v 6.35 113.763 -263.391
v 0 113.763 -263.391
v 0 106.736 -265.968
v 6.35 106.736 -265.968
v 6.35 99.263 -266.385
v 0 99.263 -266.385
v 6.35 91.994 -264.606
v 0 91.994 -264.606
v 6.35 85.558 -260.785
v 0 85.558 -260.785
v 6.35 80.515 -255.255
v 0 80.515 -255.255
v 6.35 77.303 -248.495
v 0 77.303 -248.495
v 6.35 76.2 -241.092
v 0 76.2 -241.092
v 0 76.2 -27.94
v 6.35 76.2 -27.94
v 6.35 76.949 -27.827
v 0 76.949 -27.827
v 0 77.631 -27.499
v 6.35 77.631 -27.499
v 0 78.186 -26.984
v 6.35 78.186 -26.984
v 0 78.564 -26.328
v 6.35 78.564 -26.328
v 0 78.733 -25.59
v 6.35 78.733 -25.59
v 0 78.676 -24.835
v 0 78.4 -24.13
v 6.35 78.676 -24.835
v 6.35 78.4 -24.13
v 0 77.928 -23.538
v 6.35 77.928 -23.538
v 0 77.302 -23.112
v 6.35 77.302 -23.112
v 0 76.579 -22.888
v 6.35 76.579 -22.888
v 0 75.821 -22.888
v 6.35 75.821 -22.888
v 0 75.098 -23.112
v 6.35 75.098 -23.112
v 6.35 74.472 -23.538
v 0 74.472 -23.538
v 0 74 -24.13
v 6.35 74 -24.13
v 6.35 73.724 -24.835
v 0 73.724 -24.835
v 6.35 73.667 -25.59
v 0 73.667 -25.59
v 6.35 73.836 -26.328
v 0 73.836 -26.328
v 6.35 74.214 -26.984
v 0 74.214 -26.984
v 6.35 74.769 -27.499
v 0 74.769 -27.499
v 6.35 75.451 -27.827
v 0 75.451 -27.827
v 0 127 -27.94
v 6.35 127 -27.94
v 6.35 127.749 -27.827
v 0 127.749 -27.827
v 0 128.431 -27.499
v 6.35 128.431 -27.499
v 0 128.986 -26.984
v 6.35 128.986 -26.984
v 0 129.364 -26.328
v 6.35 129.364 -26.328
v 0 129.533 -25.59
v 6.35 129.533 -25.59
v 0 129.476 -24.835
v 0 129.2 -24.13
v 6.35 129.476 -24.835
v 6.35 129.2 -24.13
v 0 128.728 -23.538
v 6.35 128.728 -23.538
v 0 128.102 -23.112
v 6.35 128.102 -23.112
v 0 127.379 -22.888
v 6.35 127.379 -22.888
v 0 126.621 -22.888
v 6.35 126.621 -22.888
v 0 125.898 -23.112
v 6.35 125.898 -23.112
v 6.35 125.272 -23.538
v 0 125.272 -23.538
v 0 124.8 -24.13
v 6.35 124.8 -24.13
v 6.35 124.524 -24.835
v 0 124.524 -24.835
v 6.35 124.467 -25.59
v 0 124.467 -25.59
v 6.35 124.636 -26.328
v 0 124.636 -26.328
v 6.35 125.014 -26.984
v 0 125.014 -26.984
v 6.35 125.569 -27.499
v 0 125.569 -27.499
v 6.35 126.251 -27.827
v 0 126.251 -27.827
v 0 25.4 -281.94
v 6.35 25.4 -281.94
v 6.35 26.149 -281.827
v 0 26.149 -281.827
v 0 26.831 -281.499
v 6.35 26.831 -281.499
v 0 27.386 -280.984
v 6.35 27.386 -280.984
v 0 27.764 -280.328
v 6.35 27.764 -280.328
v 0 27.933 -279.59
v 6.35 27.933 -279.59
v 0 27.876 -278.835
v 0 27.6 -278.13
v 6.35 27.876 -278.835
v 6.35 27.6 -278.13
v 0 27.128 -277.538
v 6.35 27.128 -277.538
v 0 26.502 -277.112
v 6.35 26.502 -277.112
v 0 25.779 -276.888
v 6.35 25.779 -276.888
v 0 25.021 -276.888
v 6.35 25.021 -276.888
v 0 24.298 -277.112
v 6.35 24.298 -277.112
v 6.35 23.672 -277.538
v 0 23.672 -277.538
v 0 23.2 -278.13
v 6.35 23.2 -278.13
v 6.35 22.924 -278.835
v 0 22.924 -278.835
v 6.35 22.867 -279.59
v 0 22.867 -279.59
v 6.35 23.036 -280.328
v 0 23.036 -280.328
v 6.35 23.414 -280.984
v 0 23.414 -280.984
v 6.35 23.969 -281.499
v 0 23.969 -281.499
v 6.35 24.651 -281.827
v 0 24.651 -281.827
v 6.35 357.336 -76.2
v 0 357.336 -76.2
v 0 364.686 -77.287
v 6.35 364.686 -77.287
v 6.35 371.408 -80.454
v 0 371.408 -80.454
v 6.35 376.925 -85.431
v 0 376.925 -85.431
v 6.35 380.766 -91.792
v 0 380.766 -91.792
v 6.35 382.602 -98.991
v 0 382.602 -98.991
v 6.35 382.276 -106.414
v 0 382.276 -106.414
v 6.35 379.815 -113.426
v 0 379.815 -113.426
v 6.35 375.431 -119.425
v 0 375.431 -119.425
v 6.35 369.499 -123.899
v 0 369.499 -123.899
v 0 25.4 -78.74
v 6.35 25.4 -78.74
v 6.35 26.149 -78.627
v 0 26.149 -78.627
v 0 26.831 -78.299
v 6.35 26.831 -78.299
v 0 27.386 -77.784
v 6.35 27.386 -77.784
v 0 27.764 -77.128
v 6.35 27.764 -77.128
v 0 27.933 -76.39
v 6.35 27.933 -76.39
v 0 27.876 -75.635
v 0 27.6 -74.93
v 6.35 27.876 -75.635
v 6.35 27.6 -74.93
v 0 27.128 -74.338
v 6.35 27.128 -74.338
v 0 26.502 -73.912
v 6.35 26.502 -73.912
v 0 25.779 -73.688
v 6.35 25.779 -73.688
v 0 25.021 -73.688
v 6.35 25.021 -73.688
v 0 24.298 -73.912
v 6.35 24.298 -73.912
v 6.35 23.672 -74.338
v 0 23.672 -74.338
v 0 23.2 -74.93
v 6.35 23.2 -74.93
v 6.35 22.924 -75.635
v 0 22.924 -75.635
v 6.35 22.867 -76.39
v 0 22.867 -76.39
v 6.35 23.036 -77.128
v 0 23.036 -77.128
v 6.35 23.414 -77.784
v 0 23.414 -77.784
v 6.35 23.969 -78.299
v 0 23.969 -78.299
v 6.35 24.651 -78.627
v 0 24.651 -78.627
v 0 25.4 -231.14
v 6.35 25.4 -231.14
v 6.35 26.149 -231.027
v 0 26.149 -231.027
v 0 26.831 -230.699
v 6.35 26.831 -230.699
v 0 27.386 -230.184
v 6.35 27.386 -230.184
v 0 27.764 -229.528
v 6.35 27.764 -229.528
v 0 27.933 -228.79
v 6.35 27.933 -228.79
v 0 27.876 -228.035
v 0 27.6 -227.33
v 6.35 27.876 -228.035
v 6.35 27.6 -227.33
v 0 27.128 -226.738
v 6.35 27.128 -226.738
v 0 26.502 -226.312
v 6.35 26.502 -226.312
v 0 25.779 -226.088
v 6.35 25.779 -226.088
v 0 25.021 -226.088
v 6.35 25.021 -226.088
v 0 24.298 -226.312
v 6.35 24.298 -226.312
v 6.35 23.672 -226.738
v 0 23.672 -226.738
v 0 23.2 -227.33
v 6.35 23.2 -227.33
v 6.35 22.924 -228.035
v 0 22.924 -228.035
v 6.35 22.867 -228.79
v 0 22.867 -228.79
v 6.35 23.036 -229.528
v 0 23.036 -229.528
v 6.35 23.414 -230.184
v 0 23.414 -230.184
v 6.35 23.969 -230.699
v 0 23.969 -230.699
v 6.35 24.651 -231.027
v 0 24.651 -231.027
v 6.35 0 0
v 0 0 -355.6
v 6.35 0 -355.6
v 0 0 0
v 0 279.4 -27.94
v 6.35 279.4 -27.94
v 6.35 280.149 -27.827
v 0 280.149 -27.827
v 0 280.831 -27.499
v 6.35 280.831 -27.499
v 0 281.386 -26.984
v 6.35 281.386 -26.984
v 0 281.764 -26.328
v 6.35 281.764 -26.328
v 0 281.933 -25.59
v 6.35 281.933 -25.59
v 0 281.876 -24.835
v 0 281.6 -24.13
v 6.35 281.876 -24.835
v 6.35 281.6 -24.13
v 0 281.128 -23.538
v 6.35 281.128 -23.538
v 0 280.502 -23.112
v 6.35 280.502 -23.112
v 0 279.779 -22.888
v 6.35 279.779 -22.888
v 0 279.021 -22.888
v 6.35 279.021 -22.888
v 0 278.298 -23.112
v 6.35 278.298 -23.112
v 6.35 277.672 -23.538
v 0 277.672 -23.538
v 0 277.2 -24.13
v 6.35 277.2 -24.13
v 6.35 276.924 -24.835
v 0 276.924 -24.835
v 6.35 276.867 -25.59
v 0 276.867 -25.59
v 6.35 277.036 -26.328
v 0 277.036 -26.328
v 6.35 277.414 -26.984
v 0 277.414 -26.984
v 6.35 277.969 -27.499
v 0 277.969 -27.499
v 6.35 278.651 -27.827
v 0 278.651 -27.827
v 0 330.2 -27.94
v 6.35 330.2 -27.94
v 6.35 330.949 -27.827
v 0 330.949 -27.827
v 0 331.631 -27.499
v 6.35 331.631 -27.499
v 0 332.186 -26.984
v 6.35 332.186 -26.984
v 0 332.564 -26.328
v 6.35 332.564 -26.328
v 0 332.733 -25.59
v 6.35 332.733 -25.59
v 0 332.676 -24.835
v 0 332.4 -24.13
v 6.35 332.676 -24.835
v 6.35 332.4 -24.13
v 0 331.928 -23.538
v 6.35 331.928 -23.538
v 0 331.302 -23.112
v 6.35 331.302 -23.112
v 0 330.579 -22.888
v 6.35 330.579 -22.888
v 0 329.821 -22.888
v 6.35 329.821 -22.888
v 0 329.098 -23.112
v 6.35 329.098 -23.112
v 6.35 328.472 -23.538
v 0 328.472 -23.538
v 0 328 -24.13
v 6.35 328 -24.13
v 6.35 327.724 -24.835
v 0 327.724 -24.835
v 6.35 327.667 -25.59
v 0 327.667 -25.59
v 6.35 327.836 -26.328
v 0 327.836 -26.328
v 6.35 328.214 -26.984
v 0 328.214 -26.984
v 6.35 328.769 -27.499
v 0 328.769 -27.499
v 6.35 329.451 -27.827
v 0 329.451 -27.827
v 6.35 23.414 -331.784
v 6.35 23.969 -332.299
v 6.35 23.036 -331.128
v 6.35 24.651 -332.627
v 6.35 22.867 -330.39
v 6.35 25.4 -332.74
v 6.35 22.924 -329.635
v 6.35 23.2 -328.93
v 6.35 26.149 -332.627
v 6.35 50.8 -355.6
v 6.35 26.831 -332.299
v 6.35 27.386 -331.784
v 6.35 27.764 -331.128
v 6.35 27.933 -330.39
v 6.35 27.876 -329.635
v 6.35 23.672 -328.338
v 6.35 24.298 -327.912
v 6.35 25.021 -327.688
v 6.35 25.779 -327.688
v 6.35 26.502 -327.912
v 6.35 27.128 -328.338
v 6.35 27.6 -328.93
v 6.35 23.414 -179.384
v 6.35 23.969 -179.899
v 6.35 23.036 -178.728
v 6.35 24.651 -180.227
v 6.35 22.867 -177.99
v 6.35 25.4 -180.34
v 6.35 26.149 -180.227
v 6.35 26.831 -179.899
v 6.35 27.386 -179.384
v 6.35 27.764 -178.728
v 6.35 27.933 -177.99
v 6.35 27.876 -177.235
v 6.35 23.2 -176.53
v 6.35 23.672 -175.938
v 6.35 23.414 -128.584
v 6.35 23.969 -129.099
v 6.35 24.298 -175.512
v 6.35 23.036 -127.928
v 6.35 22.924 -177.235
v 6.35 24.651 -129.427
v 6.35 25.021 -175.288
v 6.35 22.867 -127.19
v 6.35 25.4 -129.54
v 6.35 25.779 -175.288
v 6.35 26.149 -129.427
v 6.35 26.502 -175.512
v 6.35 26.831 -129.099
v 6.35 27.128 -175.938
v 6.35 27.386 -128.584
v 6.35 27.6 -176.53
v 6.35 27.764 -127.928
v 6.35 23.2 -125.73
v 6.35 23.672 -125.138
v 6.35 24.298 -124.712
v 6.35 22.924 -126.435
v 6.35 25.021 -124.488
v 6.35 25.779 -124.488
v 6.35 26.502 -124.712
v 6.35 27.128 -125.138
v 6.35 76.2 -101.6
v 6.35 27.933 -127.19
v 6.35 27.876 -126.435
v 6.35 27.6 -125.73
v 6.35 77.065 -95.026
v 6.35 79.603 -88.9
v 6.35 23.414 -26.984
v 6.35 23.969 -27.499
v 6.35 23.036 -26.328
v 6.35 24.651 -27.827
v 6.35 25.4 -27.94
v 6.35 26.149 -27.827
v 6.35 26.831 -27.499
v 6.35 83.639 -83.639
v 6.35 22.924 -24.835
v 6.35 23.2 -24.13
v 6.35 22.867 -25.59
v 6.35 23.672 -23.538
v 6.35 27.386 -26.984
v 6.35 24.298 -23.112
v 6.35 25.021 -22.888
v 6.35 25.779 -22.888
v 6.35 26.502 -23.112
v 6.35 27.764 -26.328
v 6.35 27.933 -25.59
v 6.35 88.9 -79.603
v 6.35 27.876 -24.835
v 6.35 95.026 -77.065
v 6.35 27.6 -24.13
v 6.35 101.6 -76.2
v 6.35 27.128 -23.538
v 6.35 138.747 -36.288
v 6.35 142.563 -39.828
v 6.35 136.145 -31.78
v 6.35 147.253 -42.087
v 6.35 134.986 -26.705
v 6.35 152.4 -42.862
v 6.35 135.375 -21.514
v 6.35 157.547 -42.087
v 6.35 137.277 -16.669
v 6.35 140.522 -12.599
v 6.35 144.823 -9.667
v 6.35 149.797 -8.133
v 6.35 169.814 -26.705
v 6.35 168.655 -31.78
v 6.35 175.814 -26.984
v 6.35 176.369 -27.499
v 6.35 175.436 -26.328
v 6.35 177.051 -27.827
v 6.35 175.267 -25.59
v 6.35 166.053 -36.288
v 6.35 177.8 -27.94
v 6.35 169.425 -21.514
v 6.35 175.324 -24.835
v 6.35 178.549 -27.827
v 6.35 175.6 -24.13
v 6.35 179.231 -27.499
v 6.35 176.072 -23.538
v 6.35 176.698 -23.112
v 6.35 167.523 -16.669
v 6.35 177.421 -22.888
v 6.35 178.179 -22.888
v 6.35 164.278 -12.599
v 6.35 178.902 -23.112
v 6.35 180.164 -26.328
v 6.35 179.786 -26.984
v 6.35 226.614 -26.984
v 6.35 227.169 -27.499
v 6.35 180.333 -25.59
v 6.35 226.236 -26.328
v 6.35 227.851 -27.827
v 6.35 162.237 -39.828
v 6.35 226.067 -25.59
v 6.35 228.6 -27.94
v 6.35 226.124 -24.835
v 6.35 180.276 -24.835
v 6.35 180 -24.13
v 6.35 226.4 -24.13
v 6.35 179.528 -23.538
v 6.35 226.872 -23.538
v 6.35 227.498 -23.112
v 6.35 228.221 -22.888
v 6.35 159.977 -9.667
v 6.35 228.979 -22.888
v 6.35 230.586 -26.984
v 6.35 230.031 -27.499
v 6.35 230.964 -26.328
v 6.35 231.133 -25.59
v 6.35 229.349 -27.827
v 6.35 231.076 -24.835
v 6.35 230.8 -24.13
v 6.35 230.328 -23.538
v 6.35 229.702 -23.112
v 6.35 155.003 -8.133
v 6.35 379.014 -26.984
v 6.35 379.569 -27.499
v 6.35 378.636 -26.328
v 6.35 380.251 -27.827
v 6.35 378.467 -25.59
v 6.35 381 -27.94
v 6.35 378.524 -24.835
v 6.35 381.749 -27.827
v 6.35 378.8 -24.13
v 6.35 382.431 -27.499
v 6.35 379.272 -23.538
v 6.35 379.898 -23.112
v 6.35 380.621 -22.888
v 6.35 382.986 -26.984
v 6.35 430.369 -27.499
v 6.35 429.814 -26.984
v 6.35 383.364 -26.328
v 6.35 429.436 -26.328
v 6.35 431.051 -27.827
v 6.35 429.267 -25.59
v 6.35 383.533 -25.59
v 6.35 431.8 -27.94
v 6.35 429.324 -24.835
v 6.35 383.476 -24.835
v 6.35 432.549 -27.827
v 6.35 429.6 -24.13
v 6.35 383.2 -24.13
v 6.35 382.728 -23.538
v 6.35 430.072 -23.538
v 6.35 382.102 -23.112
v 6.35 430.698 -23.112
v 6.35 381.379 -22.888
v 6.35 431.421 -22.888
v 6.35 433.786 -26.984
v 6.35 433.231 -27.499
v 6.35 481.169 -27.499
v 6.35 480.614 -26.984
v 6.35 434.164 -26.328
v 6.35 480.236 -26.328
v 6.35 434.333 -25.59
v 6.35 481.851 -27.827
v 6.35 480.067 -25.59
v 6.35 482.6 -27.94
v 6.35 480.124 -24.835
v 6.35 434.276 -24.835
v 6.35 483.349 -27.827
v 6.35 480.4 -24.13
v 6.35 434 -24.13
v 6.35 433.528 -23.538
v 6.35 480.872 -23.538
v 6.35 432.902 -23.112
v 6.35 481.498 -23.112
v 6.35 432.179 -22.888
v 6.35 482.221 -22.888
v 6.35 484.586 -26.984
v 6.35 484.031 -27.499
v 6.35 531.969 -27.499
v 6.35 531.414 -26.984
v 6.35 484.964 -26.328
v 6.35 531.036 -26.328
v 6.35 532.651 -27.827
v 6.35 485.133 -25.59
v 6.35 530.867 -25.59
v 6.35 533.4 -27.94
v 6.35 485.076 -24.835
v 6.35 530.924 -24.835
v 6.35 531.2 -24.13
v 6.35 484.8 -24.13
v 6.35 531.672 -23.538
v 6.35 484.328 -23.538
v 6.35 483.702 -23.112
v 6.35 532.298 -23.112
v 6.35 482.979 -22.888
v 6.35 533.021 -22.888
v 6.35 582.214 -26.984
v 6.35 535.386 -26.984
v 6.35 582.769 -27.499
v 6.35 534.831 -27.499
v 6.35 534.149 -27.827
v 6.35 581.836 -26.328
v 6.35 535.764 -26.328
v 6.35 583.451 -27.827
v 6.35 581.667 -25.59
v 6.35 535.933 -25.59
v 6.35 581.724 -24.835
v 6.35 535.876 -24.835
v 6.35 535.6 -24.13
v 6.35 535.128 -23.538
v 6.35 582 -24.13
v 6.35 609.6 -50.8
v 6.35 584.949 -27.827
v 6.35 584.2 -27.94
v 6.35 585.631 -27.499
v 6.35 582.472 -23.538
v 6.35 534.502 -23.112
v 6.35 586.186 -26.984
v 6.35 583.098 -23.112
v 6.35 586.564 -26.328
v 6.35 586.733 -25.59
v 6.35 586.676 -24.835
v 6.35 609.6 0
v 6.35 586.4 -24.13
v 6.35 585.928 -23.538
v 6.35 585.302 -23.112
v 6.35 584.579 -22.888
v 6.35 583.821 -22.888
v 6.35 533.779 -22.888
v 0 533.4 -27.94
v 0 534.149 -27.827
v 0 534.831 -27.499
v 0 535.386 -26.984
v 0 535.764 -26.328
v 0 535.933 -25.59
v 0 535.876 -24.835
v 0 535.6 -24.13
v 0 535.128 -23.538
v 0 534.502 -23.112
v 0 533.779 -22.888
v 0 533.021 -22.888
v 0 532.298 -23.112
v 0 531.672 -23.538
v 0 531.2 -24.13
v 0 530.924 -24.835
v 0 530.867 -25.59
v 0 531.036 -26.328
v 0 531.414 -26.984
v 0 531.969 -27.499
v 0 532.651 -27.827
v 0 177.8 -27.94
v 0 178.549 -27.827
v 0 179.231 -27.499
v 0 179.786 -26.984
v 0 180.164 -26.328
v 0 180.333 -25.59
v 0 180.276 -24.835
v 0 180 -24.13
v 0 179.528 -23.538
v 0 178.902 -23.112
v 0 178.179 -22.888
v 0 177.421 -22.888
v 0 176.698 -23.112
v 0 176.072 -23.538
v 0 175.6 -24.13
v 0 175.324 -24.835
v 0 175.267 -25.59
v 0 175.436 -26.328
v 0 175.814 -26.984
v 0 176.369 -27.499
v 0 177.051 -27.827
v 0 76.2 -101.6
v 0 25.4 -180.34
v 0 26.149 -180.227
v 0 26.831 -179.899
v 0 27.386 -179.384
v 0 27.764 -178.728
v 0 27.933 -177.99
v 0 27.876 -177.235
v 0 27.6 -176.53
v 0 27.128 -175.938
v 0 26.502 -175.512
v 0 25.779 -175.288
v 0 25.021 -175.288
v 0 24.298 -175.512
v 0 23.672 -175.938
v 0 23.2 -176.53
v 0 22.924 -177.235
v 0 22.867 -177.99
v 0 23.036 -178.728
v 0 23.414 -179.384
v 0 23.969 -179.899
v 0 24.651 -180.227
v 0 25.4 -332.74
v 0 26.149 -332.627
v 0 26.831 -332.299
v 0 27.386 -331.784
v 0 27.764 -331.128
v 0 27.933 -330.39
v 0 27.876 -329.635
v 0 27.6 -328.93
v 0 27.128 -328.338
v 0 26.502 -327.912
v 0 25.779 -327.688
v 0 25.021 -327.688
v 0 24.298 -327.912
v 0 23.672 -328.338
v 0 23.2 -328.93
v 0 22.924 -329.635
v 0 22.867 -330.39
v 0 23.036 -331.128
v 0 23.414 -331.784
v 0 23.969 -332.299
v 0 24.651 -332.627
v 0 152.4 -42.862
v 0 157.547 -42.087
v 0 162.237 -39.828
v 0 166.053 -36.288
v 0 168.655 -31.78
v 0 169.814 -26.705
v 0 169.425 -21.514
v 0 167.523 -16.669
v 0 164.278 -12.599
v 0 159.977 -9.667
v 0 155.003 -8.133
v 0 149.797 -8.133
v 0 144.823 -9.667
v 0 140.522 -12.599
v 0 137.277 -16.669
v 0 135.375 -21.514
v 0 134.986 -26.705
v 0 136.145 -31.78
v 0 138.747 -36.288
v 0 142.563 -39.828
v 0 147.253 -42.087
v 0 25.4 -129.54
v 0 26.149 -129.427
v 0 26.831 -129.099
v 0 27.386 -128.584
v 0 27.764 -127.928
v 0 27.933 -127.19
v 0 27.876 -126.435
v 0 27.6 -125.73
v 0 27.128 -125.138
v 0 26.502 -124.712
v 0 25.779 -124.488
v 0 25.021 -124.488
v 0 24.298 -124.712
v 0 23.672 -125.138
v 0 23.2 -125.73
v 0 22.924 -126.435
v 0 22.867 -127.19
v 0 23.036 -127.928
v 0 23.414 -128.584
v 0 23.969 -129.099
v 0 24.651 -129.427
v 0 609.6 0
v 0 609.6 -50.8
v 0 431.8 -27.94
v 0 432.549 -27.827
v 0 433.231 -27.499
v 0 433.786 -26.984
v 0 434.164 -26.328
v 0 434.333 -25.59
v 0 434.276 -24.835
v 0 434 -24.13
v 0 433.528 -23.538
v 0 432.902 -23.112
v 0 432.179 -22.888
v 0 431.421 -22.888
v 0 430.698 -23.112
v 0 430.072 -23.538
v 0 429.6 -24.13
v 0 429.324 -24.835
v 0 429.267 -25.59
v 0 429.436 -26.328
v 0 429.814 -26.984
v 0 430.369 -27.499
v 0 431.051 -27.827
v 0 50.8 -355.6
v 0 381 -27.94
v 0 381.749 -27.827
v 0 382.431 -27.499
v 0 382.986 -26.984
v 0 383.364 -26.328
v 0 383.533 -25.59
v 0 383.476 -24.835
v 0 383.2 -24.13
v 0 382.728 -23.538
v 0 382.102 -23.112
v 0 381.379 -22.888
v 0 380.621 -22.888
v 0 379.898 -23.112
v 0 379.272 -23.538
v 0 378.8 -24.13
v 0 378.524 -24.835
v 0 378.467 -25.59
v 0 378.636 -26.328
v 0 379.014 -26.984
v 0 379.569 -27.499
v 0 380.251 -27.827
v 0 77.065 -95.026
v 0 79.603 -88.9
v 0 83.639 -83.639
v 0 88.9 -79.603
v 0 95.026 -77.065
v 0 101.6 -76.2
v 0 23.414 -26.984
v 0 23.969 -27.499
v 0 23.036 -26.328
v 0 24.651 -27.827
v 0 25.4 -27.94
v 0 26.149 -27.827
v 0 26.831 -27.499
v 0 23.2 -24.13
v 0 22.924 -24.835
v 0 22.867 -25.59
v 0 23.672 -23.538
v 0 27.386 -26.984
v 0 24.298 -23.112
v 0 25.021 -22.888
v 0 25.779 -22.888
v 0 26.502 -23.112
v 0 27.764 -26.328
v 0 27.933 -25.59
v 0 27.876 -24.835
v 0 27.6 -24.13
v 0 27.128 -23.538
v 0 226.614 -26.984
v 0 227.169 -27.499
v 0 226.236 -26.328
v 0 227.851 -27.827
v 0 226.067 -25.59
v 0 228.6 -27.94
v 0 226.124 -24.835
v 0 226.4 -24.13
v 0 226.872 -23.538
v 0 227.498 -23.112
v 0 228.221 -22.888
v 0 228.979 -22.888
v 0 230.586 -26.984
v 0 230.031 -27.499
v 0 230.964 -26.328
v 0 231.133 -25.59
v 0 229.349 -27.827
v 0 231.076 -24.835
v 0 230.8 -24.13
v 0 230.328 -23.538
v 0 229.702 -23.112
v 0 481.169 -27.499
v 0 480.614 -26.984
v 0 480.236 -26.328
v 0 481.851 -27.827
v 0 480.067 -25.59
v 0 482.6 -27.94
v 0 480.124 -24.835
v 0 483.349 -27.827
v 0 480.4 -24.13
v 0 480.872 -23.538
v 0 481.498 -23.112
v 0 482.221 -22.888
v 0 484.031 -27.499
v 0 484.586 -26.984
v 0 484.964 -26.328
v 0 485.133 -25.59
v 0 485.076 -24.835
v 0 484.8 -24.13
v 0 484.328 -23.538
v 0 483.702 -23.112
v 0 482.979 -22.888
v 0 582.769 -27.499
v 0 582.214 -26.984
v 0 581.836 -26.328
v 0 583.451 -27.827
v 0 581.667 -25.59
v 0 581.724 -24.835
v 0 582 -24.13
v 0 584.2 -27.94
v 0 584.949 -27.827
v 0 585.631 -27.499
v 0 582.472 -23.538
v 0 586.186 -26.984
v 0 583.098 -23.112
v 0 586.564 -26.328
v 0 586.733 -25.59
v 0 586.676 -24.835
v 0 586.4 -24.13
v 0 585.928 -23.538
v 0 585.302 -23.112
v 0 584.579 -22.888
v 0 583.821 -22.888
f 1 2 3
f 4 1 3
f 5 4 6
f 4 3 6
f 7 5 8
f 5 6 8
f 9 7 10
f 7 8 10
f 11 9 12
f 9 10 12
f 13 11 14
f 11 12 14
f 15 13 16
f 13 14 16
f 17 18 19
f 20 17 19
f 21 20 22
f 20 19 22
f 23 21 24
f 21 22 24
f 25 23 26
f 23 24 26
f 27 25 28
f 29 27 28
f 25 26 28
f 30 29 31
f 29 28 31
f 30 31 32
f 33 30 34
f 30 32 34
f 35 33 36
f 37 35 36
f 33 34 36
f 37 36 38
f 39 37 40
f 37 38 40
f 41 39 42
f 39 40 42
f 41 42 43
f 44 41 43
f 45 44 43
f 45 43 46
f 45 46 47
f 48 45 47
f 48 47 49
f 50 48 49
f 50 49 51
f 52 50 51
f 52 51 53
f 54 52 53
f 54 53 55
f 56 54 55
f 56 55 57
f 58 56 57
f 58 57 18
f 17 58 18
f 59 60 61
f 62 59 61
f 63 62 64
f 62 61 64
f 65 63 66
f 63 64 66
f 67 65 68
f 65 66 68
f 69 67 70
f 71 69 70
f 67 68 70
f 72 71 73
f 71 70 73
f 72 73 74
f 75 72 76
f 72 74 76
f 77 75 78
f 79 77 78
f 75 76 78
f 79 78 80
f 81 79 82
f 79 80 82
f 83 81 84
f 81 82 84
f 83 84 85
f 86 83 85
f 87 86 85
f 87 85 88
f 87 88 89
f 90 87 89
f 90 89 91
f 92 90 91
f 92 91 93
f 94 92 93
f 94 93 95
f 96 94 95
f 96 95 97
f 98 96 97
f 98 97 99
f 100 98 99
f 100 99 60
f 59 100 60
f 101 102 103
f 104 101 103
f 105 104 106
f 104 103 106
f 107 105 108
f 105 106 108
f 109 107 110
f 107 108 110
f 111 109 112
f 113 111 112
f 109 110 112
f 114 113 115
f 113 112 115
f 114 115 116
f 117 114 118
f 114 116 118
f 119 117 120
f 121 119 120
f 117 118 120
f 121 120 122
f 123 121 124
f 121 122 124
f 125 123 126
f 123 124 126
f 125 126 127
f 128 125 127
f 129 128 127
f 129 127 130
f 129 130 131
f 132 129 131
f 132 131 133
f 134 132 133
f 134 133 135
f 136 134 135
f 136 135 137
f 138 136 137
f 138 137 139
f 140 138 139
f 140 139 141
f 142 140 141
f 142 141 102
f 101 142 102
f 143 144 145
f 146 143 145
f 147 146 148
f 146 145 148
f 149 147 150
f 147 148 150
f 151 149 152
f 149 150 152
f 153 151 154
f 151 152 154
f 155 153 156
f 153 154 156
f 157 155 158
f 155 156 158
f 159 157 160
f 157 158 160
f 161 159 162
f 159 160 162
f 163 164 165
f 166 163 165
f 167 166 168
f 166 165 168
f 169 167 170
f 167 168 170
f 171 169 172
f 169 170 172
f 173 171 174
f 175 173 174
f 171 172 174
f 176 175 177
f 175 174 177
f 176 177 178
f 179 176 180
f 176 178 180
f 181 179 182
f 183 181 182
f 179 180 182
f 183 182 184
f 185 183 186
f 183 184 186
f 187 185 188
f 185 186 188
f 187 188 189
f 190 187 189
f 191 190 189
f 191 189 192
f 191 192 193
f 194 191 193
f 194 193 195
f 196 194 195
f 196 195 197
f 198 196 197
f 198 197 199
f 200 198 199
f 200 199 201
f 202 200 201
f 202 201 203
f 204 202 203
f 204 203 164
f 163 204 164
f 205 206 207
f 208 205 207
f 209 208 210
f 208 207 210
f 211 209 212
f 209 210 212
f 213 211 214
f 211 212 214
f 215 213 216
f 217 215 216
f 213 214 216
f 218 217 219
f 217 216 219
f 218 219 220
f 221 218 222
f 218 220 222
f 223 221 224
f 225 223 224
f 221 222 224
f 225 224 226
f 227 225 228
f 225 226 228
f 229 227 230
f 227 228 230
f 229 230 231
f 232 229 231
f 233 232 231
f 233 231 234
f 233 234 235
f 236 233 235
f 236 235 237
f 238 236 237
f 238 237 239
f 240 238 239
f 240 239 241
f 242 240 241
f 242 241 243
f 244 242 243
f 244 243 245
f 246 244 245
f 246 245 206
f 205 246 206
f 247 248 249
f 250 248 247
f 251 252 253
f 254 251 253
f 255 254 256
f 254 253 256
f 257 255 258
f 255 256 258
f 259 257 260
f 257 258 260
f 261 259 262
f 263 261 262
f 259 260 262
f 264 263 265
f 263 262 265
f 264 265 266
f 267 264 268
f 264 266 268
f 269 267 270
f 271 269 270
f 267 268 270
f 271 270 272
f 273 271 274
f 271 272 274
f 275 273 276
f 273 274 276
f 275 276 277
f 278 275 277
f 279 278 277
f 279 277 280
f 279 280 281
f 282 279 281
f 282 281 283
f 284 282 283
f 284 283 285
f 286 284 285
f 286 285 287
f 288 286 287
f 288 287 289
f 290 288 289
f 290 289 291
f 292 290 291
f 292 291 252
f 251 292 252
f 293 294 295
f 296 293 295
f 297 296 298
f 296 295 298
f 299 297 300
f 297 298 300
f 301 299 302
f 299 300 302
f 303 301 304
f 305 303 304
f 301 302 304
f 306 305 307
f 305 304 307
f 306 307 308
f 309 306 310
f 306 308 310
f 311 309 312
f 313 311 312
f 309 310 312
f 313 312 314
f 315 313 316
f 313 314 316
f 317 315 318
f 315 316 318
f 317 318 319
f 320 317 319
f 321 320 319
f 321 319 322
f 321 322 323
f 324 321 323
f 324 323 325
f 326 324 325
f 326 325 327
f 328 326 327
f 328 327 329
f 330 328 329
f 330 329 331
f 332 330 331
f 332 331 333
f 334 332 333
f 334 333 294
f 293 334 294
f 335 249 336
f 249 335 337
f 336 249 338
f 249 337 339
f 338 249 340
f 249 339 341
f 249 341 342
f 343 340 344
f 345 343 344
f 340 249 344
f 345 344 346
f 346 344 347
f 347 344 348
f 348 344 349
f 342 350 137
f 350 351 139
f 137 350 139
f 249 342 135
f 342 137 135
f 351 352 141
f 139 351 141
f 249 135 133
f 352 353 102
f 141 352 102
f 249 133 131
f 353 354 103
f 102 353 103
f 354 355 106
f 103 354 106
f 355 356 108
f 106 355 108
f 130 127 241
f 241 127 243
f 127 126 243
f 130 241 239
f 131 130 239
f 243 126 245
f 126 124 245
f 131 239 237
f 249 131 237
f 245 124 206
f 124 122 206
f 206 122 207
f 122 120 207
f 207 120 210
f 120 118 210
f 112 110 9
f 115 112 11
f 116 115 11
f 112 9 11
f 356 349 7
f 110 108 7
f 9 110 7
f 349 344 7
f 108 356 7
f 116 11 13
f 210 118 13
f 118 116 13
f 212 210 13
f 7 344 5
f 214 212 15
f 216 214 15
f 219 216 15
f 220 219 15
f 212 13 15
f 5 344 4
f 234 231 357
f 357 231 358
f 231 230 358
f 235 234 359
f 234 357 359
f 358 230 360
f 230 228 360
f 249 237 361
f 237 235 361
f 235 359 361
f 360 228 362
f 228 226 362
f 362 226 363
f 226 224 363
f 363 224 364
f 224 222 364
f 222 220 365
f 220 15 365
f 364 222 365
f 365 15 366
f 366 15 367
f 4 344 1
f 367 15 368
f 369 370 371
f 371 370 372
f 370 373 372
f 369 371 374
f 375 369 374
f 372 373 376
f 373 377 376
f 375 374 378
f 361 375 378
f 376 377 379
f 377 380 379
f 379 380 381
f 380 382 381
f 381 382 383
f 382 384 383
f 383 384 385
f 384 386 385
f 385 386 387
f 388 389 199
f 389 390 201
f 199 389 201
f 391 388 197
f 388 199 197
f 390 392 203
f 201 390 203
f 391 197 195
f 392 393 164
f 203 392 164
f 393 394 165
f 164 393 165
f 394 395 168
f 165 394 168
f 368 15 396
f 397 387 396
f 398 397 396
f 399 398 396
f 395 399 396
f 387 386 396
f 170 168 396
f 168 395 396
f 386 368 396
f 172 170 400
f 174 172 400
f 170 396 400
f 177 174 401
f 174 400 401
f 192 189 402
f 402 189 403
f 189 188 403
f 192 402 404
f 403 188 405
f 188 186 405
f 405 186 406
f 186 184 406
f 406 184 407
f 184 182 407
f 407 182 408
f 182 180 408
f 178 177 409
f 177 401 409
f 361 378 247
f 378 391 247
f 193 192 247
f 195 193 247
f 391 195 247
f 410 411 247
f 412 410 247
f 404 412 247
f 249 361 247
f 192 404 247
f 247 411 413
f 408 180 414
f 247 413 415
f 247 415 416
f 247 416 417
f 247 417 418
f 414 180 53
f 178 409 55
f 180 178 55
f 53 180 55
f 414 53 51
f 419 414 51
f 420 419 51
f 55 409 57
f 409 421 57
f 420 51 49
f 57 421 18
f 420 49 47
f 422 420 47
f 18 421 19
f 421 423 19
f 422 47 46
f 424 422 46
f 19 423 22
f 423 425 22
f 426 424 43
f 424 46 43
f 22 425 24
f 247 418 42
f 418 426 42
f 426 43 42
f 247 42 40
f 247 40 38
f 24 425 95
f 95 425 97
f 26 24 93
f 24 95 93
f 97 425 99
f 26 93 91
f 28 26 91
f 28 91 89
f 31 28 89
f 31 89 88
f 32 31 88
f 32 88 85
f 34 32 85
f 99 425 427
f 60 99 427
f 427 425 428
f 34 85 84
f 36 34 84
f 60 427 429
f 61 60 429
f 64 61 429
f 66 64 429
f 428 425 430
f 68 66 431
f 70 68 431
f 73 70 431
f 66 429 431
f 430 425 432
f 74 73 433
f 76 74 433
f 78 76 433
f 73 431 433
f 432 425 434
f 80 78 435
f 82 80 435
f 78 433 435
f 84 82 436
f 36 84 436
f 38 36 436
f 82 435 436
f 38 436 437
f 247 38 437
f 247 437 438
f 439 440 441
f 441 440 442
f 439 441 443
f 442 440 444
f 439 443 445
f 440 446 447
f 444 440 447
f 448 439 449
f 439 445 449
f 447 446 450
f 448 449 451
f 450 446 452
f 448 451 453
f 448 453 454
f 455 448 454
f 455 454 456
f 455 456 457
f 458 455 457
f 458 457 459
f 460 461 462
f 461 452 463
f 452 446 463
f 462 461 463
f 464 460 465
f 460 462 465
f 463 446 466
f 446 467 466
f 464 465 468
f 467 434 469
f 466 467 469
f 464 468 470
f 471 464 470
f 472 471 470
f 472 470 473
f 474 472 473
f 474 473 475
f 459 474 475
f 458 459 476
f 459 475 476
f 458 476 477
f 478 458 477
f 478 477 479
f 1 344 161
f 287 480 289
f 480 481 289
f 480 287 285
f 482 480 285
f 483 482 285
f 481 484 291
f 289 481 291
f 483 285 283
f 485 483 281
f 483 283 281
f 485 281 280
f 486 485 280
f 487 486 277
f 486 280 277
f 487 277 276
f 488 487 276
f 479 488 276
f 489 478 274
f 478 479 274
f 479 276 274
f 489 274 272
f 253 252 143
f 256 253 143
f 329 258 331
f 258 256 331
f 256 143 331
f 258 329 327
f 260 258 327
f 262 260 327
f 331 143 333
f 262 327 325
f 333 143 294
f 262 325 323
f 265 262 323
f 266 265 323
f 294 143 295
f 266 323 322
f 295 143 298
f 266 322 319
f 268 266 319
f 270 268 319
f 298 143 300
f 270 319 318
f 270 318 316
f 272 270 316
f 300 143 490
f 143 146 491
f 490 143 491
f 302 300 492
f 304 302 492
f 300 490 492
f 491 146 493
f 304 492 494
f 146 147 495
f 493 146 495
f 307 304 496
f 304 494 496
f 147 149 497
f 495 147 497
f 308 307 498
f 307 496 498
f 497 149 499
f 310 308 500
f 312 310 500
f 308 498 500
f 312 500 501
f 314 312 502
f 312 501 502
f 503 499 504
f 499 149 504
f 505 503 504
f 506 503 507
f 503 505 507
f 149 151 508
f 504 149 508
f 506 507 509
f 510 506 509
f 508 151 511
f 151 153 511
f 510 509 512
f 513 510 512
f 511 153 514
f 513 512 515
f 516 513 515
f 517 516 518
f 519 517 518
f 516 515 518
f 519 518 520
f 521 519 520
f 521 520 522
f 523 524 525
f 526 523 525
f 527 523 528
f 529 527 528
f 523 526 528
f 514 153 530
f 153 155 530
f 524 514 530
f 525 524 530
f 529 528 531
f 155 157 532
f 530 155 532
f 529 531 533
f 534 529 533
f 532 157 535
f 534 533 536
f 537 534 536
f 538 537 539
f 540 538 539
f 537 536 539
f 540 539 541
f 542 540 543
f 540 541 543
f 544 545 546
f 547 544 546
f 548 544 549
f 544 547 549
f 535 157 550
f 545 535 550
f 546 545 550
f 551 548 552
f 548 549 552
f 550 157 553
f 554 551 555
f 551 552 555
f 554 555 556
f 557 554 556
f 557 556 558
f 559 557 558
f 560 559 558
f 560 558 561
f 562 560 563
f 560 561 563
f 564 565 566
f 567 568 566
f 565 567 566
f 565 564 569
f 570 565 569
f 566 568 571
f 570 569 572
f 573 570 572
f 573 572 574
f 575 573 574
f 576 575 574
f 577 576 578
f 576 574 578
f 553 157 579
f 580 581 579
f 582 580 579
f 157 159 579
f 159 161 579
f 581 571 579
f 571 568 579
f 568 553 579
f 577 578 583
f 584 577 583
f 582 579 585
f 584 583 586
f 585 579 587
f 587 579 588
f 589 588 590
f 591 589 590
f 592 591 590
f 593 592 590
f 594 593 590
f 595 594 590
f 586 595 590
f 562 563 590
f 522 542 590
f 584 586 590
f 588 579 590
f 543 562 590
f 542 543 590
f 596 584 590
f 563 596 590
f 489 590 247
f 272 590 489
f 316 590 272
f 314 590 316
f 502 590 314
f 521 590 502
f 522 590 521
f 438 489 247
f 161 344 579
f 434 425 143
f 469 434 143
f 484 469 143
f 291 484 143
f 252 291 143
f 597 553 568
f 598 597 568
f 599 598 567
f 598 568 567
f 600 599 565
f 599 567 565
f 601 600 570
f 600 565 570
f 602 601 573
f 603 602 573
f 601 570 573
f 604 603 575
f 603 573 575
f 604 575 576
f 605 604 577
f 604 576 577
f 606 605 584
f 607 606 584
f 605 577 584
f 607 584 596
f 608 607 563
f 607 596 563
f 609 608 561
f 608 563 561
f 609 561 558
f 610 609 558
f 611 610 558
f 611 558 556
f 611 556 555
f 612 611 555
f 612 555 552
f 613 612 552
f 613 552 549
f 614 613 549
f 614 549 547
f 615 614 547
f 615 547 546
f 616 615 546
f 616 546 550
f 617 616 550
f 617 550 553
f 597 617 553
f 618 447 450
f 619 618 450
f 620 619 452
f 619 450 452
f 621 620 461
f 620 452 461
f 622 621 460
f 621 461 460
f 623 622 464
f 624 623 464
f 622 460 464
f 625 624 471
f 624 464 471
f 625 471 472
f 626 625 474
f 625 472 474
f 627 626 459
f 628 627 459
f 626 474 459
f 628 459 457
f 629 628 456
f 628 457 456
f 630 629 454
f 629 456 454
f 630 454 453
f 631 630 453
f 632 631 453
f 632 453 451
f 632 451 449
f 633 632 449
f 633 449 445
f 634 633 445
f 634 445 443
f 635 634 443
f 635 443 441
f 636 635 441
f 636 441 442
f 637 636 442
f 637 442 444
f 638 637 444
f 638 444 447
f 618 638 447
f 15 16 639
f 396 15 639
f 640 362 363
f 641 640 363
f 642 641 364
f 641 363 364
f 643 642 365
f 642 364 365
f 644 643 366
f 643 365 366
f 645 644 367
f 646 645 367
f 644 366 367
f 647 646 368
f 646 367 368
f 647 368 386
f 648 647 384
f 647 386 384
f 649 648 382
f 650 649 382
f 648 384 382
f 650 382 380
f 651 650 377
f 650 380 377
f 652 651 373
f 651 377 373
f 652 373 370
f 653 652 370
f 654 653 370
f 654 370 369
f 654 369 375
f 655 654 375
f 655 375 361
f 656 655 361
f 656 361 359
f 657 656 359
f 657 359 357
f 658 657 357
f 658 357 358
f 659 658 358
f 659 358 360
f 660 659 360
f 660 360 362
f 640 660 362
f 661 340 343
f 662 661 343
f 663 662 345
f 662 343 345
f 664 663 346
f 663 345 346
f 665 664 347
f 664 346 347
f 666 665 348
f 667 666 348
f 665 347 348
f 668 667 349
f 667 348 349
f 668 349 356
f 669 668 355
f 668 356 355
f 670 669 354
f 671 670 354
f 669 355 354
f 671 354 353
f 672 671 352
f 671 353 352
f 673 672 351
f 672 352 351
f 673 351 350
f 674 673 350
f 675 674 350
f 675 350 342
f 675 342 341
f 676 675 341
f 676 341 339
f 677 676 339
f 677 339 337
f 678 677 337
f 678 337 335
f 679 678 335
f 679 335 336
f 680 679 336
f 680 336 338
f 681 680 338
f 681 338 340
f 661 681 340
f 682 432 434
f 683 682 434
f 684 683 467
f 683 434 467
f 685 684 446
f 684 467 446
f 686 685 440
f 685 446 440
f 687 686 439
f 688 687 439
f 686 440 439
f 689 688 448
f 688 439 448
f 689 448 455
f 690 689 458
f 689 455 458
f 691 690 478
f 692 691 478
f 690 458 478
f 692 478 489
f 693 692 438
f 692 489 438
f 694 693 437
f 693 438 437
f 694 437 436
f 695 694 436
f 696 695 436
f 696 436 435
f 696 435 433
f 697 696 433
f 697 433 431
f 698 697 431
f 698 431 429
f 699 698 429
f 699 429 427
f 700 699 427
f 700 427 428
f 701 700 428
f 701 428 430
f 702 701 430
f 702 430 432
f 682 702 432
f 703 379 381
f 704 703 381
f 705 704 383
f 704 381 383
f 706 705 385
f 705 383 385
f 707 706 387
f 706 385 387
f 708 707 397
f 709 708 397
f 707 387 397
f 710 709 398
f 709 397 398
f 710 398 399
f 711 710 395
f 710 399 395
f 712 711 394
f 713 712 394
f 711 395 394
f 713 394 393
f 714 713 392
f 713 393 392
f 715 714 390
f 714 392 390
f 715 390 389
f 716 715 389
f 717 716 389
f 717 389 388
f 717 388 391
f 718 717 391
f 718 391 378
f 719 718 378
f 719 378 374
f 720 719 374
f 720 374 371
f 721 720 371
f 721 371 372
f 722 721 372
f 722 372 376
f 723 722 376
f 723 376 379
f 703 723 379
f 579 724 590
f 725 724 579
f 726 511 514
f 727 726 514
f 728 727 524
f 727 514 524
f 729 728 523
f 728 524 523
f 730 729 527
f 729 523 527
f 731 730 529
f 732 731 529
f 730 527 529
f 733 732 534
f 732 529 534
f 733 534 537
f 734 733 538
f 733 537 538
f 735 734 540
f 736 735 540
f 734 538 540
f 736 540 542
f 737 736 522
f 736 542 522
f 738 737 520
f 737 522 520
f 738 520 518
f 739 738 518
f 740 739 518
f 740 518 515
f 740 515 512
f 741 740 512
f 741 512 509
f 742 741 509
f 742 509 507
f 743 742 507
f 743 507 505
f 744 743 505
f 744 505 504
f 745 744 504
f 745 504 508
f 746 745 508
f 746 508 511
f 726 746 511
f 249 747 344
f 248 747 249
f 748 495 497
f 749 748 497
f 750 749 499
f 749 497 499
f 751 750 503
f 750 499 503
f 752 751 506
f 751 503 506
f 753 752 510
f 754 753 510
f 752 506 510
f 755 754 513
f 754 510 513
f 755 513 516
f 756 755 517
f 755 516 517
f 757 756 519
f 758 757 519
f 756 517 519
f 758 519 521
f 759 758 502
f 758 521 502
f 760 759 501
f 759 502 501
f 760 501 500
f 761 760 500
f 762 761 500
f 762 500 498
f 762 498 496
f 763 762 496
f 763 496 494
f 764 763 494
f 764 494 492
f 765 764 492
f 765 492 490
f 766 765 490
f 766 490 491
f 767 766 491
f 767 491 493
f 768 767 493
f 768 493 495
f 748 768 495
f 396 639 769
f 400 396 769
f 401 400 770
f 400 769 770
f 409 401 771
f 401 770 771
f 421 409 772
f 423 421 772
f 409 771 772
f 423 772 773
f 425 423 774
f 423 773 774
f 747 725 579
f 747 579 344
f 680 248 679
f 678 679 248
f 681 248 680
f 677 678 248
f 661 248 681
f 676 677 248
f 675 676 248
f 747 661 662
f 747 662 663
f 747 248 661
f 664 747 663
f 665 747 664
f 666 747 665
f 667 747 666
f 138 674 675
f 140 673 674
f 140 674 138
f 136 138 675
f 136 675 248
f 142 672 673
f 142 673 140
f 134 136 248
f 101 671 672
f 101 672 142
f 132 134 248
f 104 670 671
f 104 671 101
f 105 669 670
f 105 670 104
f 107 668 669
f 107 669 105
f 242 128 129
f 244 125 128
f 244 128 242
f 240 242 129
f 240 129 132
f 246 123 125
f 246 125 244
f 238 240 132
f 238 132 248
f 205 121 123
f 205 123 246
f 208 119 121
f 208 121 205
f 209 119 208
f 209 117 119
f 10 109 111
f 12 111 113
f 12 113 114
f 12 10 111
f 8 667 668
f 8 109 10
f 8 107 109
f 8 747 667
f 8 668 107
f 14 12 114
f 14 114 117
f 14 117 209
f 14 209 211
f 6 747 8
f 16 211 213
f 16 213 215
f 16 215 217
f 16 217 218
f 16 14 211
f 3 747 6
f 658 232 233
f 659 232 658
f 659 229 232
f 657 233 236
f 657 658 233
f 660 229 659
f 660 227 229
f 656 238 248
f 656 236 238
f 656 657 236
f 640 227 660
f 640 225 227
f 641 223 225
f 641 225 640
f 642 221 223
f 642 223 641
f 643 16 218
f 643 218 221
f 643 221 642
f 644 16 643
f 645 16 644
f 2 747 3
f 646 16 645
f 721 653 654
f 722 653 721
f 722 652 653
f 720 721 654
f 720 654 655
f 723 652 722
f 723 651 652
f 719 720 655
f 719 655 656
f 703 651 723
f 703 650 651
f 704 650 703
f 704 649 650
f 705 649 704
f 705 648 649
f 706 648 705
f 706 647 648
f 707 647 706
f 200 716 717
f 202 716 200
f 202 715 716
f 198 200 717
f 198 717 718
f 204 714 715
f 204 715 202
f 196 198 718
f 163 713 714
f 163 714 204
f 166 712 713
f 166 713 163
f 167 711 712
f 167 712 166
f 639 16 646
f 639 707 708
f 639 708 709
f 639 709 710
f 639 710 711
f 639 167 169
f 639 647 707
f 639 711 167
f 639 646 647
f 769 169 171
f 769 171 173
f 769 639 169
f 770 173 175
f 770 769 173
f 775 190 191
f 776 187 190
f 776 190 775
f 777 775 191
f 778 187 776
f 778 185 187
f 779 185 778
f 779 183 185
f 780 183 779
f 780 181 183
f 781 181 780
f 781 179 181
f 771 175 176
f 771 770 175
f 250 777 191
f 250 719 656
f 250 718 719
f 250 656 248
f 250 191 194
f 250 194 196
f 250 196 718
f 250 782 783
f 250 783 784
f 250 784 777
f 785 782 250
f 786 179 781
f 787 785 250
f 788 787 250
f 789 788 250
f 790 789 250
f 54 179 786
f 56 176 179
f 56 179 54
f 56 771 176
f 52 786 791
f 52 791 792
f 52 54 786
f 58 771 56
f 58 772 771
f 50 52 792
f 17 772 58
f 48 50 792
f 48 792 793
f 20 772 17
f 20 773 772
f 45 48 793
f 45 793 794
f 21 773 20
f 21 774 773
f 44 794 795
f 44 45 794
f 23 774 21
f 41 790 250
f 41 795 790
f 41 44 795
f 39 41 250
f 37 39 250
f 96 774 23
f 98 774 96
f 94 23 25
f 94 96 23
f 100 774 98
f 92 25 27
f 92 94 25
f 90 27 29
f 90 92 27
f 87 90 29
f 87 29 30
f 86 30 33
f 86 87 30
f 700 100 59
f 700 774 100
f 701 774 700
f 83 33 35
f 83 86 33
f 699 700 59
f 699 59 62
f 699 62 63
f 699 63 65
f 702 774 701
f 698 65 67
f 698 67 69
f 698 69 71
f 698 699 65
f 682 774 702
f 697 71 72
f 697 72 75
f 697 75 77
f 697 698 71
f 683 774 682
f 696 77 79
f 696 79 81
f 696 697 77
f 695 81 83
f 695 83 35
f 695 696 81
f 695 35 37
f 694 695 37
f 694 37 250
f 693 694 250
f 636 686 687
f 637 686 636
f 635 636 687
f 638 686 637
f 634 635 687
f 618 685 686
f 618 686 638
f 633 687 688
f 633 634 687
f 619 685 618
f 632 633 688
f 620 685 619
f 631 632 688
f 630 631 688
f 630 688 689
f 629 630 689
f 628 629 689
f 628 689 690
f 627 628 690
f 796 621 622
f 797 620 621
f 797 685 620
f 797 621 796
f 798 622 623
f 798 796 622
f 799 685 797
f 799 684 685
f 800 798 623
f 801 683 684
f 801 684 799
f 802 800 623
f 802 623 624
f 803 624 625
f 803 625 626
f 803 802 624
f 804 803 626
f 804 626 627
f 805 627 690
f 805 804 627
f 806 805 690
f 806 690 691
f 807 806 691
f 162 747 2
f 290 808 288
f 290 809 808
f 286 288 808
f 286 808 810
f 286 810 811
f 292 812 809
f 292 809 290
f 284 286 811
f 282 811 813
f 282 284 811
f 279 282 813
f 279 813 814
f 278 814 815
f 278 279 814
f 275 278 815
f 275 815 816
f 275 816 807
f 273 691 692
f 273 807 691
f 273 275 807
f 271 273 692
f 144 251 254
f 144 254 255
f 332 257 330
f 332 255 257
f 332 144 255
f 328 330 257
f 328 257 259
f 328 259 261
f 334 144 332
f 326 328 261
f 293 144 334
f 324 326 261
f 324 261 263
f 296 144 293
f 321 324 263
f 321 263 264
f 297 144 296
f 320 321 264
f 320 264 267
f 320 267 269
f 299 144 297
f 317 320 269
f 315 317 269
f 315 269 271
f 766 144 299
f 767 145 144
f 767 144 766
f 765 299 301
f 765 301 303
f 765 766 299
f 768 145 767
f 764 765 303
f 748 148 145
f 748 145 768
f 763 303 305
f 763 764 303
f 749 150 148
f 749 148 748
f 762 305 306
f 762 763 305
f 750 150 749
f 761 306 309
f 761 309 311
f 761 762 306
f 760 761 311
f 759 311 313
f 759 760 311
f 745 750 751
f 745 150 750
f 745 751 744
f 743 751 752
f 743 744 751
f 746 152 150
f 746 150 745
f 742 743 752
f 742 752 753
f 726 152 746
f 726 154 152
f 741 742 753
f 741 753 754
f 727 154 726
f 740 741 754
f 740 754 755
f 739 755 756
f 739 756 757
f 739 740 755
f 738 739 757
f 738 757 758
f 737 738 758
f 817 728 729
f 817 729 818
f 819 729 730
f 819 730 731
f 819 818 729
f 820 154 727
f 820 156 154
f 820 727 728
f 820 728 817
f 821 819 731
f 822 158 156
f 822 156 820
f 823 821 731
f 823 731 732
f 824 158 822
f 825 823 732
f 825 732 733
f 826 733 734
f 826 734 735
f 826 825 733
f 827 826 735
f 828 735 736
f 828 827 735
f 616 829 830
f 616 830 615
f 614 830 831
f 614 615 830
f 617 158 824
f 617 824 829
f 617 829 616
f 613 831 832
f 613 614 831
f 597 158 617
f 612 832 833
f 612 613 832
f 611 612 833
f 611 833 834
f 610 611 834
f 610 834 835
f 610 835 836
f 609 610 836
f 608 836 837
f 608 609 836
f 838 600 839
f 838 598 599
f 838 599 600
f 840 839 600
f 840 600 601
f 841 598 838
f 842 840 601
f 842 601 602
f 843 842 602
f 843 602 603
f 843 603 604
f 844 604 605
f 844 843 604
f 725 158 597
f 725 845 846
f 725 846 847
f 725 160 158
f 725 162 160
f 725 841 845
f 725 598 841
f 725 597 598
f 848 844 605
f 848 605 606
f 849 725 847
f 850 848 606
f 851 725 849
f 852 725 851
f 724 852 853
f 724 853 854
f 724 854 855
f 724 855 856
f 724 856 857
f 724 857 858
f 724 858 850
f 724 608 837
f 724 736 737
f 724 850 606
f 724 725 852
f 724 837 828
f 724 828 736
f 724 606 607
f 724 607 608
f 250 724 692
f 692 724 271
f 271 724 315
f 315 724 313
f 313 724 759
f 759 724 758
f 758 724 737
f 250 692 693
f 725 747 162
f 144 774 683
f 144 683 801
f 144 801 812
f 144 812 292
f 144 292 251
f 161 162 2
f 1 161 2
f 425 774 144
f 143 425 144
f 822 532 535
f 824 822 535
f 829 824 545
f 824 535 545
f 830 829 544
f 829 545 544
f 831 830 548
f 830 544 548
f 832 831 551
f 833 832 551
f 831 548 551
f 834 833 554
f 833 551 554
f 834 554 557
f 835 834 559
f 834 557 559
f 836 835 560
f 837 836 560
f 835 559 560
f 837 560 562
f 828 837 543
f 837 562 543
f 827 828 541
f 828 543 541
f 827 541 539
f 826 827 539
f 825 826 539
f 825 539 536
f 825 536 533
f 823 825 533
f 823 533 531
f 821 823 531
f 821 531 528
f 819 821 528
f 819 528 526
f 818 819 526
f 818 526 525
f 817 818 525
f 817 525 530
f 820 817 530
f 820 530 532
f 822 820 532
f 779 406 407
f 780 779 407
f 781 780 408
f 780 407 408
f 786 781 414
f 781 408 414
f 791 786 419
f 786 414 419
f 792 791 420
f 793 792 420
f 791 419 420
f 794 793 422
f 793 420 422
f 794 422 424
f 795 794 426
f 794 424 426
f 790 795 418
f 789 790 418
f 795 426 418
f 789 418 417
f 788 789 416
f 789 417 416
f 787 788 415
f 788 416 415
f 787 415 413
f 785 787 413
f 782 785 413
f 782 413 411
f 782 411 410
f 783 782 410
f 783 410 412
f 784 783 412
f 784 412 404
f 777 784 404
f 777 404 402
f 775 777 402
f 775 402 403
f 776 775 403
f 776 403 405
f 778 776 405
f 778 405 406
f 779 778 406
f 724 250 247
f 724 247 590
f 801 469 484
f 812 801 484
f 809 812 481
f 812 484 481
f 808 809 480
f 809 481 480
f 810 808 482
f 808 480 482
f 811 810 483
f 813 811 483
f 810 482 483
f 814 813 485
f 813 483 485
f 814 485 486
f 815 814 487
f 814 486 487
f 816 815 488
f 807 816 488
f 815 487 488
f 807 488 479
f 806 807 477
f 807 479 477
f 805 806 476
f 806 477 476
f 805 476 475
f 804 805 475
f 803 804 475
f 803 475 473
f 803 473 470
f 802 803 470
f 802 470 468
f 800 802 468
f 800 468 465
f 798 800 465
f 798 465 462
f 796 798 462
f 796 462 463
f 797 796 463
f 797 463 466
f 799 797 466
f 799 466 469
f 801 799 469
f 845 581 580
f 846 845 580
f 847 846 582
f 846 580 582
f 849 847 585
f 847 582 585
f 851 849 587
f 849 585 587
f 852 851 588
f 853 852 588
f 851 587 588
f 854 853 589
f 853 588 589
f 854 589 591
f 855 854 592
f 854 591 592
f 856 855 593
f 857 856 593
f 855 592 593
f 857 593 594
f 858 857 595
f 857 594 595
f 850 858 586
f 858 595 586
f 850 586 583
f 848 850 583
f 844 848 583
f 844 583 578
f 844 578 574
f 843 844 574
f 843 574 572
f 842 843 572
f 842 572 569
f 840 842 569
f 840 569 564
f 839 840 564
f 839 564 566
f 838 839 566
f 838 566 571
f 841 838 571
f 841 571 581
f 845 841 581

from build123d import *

# Parameters (mm, degrees)
BOSS_EXTRUDE1_DEPTH = 6.35
SKETCH2_R           = 17.4625
SKETCH2_R_2         = 2.54
CUT_EXTRUDE1_DEPTH  = 706.764721773


with BuildPart() as part:
    # Sketch1 → Boss-Extrude1 (new body)
    with BuildSketch(Plane(origin=(0, 0, 0), x_dir=(0, 0, -1), z_dir=(1, 0, 0))):
        Polygon((0, 0), (0, 609.6), (50.8, 609.6), (355.6, 50.8), (355.6, 0), align=None)
        with BuildLine():
            Line((76.2, 101.6), (76.2, 357.336122773))
            ThreePointArc((76.2, 357.336122773), (95.323978482, 381.948549591), (123.898547552, 369.498966892))
            Line((123.898547552, 369.498966892), (263.390978155, 113.762844119))
            ThreePointArc((263.390978155, 113.762844119), (262.933861882, 88.634203469), (241.092430603, 76.2))
            Line((241.092430603, 76.2), (101.6, 76.2))
            ThreePointArc((101.6, 76.2), (83.639487758, 83.639487758), (76.2, 101.6))
        make_face(mode=Mode.SUBTRACT)
    extrude(amount=BOSS_EXTRUDE1_DEPTH)

    # Sketch2 → Cut-Extrude1 (cut, through all)
    with BuildSketch(Plane(origin=(6.35, 0, 0), x_dir=(0, 0, -1), z_dir=(1, 0, 0))):
        with Locations((25.4, 152.4)):
            Circle(SKETCH2_R)
        with Locations((25.4, 25.4)):
            Circle(SKETCH2_R_2)
        with Locations((76.2, 25.4)):
            Circle(SKETCH2_R_2)
        with Locations((127, 25.4)):
            Circle(SKETCH2_R_2)
        with Locations((177.8, 25.4)):
            Circle(SKETCH2_R_2)
        with Locations((228.6, 25.4)):
            Circle(SKETCH2_R_2)
        with Locations((279.4, 25.4)):
            Circle(SKETCH2_R_2)
        with Locations((25.4, 76.2)):
            Circle(SKETCH2_R_2)
        with Locations((330.2, 25.4)):
            Circle(SKETCH2_R_2)
        with Locations((25.4, 127)):
            Circle(SKETCH2_R_2)
        with Locations((25.4, 177.8)):
            Circle(SKETCH2_R_2)
        with Locations((25.4, 228.6)):
            Circle(SKETCH2_R_2)
        with Locations((25.4, 279.4)):
            Circle(SKETCH2_R_2)
        with Locations((25.4, 330.2)):
            Circle(SKETCH2_R_2)
        with Locations((25.4, 381)):
            Circle(SKETCH2_R_2)
        with Locations((25.4, 431.8)):
            Circle(SKETCH2_R_2)
        with Locations((25.4, 482.6)):
            Circle(SKETCH2_R_2)
        with Locations((25.4, 533.4)):
            Circle(SKETCH2_R_2)
        with Locations((25.4, 584.2)):
            Circle(SKETCH2_R_2)
    extrude(amount=-CUT_EXTRUDE1_DEPTH, mode=Mode.SUBTRACT)


solid = part.part
